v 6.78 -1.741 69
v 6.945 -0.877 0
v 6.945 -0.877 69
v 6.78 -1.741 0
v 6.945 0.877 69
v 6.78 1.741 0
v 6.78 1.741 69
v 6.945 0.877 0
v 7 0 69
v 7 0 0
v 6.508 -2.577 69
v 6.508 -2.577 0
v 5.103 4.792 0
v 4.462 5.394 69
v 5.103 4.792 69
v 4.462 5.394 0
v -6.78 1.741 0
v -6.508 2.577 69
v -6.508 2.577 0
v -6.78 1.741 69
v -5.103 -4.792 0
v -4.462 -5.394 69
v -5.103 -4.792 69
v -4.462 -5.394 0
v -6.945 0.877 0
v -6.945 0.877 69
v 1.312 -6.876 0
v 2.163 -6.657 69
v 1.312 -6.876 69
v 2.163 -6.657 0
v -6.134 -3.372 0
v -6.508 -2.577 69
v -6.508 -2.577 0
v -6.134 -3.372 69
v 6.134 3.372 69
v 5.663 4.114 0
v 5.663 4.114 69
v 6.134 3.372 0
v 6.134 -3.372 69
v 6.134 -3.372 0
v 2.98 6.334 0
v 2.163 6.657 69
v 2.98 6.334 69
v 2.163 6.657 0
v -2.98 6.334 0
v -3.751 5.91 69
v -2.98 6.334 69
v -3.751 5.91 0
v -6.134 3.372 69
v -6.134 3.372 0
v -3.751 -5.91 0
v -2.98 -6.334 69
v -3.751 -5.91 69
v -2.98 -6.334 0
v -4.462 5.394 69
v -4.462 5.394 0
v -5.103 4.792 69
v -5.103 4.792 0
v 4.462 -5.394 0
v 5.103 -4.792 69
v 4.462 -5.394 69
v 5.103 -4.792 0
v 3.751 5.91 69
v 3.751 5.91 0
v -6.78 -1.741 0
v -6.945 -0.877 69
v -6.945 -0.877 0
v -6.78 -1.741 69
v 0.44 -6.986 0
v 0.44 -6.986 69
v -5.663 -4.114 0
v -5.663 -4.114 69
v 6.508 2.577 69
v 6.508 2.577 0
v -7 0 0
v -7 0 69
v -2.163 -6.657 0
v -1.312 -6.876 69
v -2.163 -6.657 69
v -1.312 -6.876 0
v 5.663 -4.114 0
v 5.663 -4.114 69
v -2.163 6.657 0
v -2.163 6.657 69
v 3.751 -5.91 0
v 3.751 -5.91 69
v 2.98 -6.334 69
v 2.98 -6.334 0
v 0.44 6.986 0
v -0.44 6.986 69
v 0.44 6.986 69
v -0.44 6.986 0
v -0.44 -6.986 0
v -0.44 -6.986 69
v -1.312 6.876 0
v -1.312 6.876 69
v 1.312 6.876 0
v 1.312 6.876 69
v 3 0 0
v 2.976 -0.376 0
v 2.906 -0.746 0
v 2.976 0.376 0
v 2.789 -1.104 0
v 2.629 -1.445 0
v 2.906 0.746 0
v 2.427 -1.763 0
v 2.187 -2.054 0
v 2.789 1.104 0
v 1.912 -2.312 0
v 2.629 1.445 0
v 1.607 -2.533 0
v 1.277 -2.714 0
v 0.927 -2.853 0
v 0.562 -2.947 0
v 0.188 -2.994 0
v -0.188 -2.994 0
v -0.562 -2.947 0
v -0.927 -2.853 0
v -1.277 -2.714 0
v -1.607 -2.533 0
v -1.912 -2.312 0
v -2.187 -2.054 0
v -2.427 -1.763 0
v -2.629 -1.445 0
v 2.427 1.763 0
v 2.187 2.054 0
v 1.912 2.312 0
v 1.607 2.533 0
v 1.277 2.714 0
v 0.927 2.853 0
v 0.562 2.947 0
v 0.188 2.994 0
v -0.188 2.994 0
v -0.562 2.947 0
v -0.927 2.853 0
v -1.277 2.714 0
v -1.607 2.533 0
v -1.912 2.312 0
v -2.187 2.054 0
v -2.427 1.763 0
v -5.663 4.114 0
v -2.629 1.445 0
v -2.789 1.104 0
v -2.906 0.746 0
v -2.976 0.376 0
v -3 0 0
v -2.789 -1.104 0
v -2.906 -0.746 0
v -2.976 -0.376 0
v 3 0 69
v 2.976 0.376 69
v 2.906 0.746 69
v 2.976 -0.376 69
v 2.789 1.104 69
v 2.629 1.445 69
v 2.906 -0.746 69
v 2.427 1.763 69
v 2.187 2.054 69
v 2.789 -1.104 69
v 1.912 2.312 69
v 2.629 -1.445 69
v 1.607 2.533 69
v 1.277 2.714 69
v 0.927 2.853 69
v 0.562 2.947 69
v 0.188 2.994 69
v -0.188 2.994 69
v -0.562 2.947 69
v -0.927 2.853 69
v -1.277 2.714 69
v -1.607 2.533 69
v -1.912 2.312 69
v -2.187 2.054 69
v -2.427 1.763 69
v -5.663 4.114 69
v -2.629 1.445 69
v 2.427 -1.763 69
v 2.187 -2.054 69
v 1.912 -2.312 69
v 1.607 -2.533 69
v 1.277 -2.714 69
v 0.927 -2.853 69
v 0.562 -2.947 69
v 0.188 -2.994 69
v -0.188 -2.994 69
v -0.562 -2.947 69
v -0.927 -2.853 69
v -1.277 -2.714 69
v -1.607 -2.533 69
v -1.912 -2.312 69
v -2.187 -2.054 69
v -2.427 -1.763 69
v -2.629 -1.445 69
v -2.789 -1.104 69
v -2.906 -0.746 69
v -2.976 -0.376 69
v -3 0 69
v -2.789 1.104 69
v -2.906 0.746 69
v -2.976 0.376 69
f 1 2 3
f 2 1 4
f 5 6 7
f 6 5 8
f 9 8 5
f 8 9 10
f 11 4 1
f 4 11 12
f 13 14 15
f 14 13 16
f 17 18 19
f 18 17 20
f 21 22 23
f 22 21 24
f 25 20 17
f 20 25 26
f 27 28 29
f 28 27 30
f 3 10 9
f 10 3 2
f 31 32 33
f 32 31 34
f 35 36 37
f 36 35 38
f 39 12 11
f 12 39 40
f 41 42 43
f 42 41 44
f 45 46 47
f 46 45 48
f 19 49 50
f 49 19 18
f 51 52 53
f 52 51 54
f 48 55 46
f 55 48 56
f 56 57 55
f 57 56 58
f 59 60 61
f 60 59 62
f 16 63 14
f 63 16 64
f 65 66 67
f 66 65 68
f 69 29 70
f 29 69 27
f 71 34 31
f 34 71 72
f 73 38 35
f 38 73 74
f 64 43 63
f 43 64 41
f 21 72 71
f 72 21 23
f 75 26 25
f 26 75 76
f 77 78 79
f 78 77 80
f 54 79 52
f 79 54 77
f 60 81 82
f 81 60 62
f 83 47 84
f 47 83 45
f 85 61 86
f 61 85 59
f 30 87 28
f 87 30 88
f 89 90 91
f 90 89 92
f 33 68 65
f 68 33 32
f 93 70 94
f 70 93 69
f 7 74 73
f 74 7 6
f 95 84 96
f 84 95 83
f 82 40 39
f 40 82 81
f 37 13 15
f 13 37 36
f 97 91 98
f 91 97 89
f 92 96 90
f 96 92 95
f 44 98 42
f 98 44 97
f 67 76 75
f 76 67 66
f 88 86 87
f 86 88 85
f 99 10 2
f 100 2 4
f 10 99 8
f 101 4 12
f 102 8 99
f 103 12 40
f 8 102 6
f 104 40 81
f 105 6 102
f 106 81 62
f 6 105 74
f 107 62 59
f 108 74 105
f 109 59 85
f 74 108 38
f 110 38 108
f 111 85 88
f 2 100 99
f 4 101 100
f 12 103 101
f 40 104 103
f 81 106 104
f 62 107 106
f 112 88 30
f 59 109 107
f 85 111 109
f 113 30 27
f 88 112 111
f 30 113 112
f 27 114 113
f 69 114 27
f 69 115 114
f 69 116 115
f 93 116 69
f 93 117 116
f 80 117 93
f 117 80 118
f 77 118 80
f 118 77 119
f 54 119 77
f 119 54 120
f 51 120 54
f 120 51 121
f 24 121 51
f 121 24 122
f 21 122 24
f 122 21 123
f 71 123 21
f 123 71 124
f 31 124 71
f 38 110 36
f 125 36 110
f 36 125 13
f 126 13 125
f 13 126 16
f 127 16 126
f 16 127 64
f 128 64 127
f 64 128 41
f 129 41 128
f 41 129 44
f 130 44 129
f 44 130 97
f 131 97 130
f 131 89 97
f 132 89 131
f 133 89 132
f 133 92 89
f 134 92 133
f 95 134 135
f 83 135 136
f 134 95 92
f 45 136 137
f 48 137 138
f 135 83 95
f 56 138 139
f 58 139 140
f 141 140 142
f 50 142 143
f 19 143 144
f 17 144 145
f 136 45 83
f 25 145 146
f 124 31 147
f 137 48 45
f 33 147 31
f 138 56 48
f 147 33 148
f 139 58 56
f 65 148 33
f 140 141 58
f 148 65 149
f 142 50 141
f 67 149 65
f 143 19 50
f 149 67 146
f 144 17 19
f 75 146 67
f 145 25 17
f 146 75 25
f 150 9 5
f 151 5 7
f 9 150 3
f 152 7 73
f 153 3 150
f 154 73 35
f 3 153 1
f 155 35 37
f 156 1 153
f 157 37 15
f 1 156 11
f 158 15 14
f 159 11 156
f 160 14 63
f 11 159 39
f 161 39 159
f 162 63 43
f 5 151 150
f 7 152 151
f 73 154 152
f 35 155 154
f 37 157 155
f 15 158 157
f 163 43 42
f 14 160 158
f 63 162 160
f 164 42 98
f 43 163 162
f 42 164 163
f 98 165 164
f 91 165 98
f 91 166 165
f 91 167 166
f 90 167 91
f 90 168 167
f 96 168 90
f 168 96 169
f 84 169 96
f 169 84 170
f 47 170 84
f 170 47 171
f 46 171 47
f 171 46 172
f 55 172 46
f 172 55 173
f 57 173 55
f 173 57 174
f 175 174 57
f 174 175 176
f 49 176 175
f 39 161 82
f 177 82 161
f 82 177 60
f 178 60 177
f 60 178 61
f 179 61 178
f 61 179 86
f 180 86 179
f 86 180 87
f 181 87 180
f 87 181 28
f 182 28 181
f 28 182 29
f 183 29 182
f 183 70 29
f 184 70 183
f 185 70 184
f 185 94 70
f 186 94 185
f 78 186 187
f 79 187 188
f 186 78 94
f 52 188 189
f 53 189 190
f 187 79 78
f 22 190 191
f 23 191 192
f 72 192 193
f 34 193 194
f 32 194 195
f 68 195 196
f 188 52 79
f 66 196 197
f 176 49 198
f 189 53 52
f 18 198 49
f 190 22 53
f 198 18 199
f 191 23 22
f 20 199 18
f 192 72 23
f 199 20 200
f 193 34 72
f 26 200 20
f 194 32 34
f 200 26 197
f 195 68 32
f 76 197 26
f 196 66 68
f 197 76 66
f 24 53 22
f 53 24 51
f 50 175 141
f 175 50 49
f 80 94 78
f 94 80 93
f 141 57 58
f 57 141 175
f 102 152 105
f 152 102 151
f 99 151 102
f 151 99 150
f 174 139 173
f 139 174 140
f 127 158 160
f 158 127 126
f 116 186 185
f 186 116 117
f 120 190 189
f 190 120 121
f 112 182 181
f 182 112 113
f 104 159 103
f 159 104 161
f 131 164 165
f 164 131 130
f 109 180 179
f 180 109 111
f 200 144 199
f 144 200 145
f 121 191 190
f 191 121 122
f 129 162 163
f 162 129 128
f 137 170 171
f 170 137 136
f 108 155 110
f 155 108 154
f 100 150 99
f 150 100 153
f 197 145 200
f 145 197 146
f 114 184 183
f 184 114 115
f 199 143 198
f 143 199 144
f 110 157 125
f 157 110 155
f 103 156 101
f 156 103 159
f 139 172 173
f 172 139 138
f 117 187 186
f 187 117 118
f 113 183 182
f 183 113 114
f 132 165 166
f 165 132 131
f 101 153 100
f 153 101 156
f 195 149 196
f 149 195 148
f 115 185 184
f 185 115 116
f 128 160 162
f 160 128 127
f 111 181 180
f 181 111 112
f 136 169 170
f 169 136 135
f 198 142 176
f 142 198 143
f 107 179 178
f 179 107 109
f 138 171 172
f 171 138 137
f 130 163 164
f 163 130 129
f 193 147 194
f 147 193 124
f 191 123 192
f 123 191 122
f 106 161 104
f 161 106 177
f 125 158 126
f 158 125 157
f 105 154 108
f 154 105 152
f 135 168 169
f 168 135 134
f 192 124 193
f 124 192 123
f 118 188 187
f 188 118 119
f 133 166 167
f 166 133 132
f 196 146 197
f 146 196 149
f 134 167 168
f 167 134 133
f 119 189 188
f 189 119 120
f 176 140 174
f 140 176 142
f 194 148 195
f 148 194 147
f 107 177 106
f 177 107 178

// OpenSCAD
$fn = 50;


difference() {
	union() {
		cylinder(h = 69, r = 7.0000000000);
	}
	union() {
		translate(v = [0, 0, -100]) {
			cylinder(h = 200, r = 3.0000000000);
		}
	}
}
